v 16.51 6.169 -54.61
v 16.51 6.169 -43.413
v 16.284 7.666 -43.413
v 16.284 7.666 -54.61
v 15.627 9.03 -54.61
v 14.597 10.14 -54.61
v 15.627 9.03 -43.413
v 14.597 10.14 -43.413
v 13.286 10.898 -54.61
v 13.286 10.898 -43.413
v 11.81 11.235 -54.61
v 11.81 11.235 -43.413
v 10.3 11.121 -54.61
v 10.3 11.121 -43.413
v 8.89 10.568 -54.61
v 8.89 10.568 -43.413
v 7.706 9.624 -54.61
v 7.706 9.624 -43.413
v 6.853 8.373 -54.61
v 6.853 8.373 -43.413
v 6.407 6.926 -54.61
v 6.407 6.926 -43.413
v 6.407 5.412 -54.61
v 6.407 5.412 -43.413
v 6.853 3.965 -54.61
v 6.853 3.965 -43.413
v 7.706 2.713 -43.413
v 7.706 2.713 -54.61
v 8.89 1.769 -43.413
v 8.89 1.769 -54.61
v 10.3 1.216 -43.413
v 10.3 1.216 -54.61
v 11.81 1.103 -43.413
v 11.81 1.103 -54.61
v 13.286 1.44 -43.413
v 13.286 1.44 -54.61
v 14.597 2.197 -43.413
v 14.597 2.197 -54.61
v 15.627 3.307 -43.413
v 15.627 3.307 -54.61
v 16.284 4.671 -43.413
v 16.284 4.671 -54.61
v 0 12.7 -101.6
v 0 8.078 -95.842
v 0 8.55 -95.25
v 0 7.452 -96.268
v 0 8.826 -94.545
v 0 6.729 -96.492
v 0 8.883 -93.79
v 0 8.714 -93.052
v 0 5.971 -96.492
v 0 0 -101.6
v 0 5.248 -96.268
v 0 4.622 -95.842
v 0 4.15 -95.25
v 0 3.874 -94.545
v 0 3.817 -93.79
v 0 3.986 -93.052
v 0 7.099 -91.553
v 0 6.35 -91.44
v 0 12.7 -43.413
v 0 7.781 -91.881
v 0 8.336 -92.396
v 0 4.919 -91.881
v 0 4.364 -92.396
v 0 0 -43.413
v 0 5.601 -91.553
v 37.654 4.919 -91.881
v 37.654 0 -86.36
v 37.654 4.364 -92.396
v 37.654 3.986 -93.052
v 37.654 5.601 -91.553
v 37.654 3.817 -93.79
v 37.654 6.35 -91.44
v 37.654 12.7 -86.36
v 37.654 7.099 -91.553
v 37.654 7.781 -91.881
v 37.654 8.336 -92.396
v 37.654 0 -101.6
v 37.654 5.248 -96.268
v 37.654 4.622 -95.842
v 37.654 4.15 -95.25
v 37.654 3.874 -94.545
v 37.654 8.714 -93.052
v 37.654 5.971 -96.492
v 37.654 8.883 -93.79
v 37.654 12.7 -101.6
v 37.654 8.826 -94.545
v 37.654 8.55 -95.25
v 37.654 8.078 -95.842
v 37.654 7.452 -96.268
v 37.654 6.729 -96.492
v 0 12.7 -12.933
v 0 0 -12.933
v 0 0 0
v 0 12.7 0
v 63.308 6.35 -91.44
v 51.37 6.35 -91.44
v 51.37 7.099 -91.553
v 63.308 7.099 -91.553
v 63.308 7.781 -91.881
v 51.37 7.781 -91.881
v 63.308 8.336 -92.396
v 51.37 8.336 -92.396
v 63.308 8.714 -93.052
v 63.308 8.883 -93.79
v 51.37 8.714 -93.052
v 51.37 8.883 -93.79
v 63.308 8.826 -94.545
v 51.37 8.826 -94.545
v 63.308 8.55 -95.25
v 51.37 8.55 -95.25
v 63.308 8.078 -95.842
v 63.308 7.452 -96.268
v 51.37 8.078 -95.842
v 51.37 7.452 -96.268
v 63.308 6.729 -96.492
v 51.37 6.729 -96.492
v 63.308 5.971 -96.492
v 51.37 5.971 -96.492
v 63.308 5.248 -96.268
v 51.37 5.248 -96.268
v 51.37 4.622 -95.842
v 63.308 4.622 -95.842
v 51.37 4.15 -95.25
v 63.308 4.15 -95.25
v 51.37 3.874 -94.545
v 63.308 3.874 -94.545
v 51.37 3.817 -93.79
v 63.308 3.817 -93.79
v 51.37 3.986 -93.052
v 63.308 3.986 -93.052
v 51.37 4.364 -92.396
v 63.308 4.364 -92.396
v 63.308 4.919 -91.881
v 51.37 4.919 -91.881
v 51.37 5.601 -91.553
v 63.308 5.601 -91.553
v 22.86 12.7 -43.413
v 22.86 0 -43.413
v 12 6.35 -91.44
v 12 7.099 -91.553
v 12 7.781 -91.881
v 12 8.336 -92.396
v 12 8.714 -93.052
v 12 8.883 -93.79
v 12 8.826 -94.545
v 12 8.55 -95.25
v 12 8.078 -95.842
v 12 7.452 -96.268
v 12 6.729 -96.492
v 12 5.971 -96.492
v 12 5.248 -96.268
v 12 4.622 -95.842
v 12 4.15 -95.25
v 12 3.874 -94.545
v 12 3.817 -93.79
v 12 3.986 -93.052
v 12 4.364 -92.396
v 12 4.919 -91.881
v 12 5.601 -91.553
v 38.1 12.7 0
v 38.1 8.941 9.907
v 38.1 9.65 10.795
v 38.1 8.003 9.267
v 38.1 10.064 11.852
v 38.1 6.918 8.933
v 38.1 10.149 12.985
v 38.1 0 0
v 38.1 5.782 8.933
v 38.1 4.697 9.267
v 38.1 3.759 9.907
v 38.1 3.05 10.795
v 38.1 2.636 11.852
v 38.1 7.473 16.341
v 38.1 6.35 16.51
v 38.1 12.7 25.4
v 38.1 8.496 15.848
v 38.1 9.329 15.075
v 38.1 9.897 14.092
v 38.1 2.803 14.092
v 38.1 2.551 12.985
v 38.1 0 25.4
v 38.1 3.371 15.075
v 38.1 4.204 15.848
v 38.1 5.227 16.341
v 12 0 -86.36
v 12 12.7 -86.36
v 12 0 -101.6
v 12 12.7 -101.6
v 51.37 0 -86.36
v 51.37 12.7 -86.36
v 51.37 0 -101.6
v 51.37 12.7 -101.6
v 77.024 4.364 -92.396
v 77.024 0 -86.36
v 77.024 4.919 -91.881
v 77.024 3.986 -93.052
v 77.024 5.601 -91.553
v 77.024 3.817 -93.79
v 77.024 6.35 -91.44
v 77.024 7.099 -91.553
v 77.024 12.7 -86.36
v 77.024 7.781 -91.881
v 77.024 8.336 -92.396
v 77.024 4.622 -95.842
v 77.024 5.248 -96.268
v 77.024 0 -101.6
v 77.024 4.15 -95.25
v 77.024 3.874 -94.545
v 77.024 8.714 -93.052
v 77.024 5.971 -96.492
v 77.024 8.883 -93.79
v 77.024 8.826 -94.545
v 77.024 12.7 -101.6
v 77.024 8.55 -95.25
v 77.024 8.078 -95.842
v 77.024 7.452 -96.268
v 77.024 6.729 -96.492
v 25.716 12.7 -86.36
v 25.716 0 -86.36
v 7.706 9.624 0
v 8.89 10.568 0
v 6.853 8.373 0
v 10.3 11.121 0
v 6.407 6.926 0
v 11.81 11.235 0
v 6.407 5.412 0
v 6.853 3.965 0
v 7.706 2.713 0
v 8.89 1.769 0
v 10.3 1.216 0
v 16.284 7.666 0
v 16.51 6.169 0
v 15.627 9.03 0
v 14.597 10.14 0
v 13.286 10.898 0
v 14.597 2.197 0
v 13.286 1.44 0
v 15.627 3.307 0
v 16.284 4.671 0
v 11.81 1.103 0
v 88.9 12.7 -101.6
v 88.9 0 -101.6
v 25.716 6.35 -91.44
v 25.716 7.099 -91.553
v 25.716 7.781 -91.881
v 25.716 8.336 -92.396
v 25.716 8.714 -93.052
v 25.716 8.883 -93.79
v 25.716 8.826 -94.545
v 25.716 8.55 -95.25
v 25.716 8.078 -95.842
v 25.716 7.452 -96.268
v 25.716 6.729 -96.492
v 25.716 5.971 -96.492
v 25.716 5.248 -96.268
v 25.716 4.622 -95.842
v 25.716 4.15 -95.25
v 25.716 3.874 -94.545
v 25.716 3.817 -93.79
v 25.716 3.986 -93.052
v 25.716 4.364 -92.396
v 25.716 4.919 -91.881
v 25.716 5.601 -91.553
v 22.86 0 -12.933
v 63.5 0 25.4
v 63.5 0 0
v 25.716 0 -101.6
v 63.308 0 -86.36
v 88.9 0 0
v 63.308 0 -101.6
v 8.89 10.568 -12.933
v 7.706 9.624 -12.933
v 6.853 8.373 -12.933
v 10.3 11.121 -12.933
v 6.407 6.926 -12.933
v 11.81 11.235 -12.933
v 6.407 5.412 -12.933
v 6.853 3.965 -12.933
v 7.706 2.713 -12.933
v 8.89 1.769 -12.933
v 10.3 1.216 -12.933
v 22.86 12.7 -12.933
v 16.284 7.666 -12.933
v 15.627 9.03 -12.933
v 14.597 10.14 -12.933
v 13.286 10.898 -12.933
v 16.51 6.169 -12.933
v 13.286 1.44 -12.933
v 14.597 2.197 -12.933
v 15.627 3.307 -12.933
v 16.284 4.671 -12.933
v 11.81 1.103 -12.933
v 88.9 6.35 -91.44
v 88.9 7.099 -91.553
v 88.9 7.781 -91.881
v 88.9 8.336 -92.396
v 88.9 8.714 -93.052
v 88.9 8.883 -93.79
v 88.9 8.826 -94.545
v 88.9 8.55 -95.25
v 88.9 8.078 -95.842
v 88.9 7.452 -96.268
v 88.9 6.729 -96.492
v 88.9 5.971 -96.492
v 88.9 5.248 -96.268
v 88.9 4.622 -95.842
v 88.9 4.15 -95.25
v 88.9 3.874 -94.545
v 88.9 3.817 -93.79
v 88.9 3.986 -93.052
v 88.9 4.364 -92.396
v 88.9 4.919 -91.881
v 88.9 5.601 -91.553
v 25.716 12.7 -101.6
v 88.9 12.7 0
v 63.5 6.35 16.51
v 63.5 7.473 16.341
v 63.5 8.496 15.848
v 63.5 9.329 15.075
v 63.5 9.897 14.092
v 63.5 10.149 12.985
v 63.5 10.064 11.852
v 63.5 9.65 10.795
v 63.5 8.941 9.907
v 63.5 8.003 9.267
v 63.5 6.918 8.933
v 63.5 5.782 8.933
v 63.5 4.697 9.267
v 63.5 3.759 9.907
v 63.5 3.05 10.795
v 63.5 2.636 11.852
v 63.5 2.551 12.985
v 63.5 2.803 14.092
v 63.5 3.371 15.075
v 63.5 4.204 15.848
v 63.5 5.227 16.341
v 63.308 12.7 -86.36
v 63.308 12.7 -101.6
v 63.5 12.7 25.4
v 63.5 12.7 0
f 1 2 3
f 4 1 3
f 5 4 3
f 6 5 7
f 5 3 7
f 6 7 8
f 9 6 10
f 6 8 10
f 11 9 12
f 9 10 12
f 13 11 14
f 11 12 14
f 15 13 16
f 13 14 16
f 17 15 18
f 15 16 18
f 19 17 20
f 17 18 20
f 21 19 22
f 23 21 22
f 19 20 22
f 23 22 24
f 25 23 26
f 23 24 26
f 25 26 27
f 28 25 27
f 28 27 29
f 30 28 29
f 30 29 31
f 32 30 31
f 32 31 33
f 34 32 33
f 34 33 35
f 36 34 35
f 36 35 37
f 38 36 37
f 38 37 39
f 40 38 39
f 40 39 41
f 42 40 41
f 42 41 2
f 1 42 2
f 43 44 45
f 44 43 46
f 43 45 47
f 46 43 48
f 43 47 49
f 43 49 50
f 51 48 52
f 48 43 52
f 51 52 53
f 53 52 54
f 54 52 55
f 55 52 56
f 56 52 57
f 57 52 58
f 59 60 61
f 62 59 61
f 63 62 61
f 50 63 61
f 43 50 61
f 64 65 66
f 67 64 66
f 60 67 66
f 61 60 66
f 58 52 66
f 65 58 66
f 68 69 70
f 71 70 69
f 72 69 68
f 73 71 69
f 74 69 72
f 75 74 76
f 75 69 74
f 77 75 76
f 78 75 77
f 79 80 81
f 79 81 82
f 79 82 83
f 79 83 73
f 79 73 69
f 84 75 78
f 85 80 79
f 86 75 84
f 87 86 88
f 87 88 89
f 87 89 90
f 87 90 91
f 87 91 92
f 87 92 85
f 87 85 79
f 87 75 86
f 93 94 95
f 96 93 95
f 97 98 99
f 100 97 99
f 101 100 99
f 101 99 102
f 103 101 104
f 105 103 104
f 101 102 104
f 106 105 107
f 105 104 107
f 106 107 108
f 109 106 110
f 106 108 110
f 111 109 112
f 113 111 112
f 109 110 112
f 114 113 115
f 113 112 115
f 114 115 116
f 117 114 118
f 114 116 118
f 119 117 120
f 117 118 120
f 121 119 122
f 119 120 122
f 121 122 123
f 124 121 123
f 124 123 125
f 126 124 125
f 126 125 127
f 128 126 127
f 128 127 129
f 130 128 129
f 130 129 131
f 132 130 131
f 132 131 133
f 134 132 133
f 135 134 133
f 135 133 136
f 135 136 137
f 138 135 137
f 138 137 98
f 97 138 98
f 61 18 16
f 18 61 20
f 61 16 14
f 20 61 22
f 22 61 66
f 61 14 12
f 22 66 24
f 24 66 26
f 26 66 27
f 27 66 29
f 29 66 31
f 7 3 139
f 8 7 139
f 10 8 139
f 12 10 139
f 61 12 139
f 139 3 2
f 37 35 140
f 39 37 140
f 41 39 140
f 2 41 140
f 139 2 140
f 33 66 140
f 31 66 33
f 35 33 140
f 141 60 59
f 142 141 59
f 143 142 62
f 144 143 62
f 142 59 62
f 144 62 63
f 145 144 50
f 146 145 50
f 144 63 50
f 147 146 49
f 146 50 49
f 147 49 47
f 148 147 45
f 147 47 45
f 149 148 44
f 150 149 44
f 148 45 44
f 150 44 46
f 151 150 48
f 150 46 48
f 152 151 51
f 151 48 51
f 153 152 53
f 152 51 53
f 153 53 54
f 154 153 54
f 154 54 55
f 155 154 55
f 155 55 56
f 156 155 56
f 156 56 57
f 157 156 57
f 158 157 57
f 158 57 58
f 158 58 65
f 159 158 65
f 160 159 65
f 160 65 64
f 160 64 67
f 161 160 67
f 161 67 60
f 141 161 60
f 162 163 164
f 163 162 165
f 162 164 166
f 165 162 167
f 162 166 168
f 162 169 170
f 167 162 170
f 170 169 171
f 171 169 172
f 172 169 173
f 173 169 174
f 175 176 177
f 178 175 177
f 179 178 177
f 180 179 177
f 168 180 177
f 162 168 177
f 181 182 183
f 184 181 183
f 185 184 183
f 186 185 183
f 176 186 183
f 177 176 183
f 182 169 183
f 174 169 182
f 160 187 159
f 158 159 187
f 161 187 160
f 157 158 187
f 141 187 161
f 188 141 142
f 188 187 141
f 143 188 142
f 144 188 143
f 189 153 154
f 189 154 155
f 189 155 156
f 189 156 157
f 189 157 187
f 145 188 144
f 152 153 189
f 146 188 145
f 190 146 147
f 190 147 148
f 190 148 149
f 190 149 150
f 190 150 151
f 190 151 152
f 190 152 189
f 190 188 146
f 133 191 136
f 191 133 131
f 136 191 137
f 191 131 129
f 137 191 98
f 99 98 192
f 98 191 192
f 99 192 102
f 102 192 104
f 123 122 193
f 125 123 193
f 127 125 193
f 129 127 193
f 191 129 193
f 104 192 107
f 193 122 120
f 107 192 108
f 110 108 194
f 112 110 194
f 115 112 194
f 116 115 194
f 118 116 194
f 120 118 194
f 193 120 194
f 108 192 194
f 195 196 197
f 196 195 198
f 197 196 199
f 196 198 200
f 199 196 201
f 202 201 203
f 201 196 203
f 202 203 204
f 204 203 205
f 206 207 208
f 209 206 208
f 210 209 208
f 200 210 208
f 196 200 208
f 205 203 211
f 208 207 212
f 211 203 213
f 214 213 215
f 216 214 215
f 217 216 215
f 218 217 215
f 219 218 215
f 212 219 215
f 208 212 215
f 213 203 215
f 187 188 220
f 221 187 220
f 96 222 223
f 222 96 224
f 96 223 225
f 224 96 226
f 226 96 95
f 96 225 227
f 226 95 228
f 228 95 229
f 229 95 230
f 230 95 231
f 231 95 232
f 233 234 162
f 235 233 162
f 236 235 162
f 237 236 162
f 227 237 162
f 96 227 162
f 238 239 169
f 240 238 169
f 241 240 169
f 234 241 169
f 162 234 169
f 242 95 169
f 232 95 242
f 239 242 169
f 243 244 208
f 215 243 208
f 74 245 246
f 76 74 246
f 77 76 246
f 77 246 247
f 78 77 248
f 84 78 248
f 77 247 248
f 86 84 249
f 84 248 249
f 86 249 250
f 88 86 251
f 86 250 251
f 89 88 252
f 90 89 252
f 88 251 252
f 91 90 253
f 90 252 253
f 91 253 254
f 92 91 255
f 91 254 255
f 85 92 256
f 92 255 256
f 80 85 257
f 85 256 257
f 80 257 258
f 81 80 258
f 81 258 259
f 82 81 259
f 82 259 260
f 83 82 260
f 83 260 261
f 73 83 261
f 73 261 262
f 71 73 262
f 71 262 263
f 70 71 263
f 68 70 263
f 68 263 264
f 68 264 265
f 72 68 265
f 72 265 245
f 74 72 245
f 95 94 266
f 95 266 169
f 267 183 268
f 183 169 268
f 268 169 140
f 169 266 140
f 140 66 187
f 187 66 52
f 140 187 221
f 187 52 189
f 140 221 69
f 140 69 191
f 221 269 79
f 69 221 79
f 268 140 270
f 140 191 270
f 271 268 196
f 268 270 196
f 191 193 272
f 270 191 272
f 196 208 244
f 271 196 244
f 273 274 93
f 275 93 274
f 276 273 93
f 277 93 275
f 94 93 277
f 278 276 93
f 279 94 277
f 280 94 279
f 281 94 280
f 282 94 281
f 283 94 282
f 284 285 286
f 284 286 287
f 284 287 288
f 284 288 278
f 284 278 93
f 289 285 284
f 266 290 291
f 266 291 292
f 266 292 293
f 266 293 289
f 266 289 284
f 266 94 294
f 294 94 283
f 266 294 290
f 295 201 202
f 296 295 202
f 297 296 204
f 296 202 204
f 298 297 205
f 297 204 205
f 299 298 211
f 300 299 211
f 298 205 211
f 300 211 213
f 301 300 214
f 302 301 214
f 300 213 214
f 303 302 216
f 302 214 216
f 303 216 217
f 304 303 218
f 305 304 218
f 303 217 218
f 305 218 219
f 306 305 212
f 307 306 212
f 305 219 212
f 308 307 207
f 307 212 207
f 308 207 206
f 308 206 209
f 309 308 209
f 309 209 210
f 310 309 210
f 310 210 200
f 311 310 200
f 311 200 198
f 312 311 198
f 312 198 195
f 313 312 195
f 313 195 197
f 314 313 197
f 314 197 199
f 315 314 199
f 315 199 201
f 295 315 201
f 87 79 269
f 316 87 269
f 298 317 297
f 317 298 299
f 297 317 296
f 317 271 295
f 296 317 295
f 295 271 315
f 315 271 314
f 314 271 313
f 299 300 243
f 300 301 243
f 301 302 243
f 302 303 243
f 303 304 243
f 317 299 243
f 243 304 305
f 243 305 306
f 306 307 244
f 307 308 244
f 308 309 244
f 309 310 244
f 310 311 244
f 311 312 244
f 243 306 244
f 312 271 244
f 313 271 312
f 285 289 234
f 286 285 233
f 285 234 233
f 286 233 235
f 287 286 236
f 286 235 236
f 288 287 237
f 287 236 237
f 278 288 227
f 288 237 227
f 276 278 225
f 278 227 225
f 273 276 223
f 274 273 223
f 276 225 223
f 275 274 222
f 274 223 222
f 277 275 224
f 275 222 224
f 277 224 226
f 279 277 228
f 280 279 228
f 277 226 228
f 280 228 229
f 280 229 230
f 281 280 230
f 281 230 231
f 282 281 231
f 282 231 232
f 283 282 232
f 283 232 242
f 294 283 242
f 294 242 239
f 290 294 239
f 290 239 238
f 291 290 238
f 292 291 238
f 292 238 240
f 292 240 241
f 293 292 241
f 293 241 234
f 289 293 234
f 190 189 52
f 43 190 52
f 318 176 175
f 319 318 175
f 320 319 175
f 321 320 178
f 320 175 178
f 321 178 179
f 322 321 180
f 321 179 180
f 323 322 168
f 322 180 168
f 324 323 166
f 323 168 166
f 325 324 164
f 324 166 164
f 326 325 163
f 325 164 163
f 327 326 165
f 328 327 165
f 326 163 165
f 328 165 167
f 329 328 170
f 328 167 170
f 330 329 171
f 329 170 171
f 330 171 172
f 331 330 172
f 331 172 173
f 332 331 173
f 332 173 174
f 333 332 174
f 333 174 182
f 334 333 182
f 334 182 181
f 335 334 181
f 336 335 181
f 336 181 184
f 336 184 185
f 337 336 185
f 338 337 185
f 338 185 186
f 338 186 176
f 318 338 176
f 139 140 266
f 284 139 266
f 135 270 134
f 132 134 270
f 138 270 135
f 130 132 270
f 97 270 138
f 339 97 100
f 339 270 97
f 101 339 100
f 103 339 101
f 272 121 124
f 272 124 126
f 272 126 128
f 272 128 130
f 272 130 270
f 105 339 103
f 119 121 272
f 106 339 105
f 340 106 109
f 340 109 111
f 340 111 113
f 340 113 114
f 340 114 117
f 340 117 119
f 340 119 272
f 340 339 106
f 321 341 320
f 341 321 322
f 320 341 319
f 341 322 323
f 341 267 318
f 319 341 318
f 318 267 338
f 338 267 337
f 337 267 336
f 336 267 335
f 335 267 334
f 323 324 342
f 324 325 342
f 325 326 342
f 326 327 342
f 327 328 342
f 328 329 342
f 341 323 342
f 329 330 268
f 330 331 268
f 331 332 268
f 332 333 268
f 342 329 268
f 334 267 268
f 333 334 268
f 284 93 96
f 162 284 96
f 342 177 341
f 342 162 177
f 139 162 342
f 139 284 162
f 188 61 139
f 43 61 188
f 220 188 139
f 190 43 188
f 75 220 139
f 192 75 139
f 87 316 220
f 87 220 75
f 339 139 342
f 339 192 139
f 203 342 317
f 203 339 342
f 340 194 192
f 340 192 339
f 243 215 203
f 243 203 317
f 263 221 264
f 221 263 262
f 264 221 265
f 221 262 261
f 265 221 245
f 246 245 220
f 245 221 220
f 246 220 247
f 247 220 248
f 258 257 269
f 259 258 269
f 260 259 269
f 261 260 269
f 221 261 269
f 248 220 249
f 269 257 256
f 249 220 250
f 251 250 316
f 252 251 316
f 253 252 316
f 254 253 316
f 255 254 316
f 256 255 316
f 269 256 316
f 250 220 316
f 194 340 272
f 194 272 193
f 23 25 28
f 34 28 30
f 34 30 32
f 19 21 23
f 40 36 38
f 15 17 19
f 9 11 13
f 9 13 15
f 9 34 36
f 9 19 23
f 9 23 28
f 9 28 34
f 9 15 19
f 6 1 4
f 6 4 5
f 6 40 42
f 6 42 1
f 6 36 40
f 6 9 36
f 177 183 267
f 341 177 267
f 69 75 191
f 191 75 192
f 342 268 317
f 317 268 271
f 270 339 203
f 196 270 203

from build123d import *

# Parameters (mm, degrees)
BOSS_EXTRUDE1_DEPTH = 12.7
SKETCH3_W           = 13.716
SKETCH3_H           = 15.24
CUT_EXTRUDE1_DEPTH  = 12.7
SKETCH4_R           = 2.54
SKETCH4_R_2         = 3.81
CUT_EXTRUDE2_DEPTH  = 91.44
SKETCH7_W           = 22.86
SKETCH7_H           = 30.48
CUT_EXTRUDE10_DEPTH = 18.288
SKETCH8_R           = 5.08
CUT_EXTRUDE12_DEPTH = 54.61


with BuildPart() as part:
    # Sketch1 → Boss-Extrude1 (new body)
    with BuildSketch(Plane(origin=(0, 0, 0), x_dir=(1, 0, 0), z_dir=(0, 1, 0))):
        Polygon((63.5, 0), (88.9, 0), (88.9, 101.6), (0, 101.6), (0, 0), (38.1, 0), (38.1, -25.4), (63.5, -25.4), align=None)
    extrude(amount=BOSS_EXTRUDE1_DEPTH)

    # Sketch3 → Cut-Extrude1 (cut)
    with BuildSketch(Plane(origin=(0, 12.7, 0), x_dir=(1, 0, 0), z_dir=(0, 1, 0))):
        with Locations((18.858, 93.98)):
            Rectangle(SKETCH3_W, SKETCH3_H)
        with Locations((44.512, 93.98)):
            Rectangle(SKETCH3_W, SKETCH3_H)
        with Locations((70.166, 93.98)):
            Rectangle(SKETCH3_W, SKETCH3_H)
    extrude(amount=-CUT_EXTRUDE1_DEPTH, mode=Mode.SUBTRACT)

    # Sketch4 → Cut-Extrude2 (cut)
    with BuildSketch(Plane.ZY):
        with Locations((-93.98, 6.35)):
            Circle(SKETCH4_R)
        with Locations((12.7, 6.35)):
            Circle(SKETCH4_R_2)
    extrude(amount=-CUT_EXTRUDE2_DEPTH, mode=Mode.SUBTRACT)

    # Sketch7 → Cut-Extrude10 (cut)
    with BuildSketch(Plane.XZ):
        with Locations((11.43, -28.172925588)):
            Rectangle(SKETCH7_W, SKETCH7_H)
    extrude(amount=-CUT_EXTRUDE10_DEPTH, mode=Mode.SUBTRACT)

    # Sketch8 → Cut-Extrude12 (cut)
    with BuildSketch(Plane.XY):
        with Locations((11.43, 6.168740828)):
            Circle(SKETCH8_R)
    extrude(amount=-CUT_EXTRUDE12_DEPTH, mode=Mode.SUBTRACT)


solid = part.part
